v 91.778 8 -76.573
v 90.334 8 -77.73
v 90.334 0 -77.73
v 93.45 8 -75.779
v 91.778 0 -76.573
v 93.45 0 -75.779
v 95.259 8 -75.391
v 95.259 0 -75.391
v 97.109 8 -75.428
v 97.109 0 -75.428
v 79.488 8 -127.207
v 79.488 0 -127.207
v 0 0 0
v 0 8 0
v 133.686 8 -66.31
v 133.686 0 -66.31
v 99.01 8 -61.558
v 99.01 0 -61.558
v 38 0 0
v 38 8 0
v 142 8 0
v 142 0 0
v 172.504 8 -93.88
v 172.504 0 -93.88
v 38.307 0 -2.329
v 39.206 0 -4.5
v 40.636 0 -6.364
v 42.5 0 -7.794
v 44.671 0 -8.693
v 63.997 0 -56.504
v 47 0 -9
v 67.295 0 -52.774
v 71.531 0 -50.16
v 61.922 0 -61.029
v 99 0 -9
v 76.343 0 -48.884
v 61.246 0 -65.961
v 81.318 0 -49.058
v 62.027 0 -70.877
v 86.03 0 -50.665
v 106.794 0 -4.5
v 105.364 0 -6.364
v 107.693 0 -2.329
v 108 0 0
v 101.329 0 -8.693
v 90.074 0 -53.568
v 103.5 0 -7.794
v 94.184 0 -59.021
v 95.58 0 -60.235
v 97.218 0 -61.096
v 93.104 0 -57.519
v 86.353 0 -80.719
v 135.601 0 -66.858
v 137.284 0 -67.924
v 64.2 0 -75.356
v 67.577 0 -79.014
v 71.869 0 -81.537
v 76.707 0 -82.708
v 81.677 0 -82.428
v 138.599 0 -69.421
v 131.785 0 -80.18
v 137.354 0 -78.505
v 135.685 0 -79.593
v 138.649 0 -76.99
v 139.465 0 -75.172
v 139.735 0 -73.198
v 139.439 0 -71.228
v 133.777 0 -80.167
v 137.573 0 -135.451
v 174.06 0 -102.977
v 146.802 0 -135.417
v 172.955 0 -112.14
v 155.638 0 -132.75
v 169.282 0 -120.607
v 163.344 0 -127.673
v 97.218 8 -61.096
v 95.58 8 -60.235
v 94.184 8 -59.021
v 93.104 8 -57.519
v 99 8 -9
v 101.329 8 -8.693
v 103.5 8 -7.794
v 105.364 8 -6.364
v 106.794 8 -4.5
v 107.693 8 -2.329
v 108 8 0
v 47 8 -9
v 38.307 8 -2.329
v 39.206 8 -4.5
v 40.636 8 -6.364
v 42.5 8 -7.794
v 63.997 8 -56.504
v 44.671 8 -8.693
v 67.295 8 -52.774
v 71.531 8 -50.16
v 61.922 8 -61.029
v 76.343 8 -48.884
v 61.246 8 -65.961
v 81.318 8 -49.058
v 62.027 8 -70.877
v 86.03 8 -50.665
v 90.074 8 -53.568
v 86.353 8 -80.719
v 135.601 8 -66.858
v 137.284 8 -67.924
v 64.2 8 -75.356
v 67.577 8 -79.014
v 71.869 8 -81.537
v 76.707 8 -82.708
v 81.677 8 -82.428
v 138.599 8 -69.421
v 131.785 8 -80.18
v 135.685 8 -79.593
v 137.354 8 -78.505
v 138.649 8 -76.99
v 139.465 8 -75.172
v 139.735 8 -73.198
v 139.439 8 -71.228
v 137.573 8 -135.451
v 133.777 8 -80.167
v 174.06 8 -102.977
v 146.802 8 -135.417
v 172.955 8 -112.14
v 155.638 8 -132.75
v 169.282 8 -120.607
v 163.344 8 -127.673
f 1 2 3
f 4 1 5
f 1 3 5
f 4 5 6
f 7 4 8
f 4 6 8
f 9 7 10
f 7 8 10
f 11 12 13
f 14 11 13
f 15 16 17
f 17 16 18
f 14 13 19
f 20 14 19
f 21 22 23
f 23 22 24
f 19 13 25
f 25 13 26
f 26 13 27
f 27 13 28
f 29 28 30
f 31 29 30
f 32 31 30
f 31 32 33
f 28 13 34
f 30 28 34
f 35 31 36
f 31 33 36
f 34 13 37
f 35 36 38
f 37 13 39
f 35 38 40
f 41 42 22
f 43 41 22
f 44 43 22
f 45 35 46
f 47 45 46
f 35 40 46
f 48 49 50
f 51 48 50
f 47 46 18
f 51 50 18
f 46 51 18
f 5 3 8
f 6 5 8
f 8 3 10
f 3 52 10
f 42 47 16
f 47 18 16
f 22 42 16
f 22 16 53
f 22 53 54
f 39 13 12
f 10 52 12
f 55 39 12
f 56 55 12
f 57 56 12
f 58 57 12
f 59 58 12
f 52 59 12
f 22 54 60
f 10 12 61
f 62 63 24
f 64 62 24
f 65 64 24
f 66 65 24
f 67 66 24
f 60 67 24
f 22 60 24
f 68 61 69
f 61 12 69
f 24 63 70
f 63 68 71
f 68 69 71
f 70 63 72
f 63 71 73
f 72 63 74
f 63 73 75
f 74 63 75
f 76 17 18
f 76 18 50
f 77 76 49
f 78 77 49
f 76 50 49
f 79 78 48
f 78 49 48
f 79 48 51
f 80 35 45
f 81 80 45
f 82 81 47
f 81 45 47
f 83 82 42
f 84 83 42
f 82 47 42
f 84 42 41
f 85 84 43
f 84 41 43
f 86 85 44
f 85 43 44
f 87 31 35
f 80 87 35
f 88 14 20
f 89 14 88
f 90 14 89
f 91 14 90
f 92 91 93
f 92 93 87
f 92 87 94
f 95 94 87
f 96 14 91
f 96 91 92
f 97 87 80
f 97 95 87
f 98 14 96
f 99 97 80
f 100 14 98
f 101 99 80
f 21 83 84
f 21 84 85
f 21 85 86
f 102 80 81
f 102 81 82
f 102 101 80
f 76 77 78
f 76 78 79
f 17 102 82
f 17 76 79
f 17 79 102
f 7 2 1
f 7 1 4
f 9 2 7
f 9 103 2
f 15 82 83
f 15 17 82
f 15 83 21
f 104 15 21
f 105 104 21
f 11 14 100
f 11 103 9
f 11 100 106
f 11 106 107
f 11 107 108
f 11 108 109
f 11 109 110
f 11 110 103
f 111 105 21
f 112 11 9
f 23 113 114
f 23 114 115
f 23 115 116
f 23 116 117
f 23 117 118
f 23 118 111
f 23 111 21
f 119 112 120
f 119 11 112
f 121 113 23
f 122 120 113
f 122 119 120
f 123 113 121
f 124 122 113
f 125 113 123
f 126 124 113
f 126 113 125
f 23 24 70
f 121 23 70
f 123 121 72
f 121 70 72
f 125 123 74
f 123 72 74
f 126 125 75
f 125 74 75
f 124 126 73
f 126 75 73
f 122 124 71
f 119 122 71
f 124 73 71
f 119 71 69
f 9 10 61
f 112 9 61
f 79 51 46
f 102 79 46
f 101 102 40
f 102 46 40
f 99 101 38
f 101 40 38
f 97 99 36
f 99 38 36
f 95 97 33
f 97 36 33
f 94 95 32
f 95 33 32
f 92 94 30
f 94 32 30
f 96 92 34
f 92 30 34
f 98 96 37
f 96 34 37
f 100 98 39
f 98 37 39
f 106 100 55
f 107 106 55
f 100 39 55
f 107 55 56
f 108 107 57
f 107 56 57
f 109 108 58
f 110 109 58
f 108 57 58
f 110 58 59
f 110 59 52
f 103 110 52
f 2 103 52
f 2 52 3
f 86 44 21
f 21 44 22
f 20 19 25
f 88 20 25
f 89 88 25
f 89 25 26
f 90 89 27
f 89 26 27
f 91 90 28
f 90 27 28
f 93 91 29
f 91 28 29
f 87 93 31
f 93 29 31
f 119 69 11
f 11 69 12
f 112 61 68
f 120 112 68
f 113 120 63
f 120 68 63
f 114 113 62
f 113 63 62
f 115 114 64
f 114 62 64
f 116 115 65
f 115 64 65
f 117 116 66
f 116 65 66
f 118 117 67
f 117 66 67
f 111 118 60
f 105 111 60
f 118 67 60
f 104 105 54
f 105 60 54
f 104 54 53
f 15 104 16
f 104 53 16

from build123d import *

# Parameters (mm, degrees)
BOSS_EXTRUDE1_DEPTH = 8


with BuildPart() as part:
    # Sketch1 → Boss-Extrude1 (new body)
    with BuildSketch(Plane(origin=(0, 0, 0), x_dir=(1, 0, 0), z_dir=(0, 1, 0))):
        with BuildLine():
            Line((0, 0), (38, 0))
            ThreePointArc((38, 0), (40.636038969, 6.363961031), (47, 9))
            Line((47, 9), (99, 9))
            ThreePointArc((99, 9), (105.363961031, 6.363961031), (108, 0))
            Line((108, 0), (142, 0))
            Line((142, 0), (172.50354814, 93.880267937))
            ThreePointArc((172.50354814, 93.880267937), (166.569139078, 124.354715336), (137.573015724, 135.451290736))
            Line((137.573015724, 135.451290736), (79.487889635, 127.207214423))
            Line((79.487889635, 127.207214423), (0, 0))
        make_face()
        with BuildLine():
            Line((97.109133521, 75.428206388), (131.785075785, 80.179945877))
            ThreePointArc((131.785075785, 80.179945877), (139.670612135, 74.195105322), (133.68577158, 66.309568971))
            Line((133.68577158, 66.309568971), (99.009829317, 61.557829483))
            ThreePointArc((99.009829317, 61.557829483), (95.579909698, 60.235342824), (93.103530342, 57.518568112))
            ThreePointArc((93.103530342, 57.518568112), (61.402056741, 63.469750476), (90.33394504, 77.729688746))
            ThreePointArc((90.33394504, 77.729688746), (93.449886138, 75.779245046), (97.109133521, 75.428206388))
        make_face(mode=Mode.SUBTRACT)
    extrude(amount=BOSS_EXTRUDE1_DEPTH)


solid = part.part
